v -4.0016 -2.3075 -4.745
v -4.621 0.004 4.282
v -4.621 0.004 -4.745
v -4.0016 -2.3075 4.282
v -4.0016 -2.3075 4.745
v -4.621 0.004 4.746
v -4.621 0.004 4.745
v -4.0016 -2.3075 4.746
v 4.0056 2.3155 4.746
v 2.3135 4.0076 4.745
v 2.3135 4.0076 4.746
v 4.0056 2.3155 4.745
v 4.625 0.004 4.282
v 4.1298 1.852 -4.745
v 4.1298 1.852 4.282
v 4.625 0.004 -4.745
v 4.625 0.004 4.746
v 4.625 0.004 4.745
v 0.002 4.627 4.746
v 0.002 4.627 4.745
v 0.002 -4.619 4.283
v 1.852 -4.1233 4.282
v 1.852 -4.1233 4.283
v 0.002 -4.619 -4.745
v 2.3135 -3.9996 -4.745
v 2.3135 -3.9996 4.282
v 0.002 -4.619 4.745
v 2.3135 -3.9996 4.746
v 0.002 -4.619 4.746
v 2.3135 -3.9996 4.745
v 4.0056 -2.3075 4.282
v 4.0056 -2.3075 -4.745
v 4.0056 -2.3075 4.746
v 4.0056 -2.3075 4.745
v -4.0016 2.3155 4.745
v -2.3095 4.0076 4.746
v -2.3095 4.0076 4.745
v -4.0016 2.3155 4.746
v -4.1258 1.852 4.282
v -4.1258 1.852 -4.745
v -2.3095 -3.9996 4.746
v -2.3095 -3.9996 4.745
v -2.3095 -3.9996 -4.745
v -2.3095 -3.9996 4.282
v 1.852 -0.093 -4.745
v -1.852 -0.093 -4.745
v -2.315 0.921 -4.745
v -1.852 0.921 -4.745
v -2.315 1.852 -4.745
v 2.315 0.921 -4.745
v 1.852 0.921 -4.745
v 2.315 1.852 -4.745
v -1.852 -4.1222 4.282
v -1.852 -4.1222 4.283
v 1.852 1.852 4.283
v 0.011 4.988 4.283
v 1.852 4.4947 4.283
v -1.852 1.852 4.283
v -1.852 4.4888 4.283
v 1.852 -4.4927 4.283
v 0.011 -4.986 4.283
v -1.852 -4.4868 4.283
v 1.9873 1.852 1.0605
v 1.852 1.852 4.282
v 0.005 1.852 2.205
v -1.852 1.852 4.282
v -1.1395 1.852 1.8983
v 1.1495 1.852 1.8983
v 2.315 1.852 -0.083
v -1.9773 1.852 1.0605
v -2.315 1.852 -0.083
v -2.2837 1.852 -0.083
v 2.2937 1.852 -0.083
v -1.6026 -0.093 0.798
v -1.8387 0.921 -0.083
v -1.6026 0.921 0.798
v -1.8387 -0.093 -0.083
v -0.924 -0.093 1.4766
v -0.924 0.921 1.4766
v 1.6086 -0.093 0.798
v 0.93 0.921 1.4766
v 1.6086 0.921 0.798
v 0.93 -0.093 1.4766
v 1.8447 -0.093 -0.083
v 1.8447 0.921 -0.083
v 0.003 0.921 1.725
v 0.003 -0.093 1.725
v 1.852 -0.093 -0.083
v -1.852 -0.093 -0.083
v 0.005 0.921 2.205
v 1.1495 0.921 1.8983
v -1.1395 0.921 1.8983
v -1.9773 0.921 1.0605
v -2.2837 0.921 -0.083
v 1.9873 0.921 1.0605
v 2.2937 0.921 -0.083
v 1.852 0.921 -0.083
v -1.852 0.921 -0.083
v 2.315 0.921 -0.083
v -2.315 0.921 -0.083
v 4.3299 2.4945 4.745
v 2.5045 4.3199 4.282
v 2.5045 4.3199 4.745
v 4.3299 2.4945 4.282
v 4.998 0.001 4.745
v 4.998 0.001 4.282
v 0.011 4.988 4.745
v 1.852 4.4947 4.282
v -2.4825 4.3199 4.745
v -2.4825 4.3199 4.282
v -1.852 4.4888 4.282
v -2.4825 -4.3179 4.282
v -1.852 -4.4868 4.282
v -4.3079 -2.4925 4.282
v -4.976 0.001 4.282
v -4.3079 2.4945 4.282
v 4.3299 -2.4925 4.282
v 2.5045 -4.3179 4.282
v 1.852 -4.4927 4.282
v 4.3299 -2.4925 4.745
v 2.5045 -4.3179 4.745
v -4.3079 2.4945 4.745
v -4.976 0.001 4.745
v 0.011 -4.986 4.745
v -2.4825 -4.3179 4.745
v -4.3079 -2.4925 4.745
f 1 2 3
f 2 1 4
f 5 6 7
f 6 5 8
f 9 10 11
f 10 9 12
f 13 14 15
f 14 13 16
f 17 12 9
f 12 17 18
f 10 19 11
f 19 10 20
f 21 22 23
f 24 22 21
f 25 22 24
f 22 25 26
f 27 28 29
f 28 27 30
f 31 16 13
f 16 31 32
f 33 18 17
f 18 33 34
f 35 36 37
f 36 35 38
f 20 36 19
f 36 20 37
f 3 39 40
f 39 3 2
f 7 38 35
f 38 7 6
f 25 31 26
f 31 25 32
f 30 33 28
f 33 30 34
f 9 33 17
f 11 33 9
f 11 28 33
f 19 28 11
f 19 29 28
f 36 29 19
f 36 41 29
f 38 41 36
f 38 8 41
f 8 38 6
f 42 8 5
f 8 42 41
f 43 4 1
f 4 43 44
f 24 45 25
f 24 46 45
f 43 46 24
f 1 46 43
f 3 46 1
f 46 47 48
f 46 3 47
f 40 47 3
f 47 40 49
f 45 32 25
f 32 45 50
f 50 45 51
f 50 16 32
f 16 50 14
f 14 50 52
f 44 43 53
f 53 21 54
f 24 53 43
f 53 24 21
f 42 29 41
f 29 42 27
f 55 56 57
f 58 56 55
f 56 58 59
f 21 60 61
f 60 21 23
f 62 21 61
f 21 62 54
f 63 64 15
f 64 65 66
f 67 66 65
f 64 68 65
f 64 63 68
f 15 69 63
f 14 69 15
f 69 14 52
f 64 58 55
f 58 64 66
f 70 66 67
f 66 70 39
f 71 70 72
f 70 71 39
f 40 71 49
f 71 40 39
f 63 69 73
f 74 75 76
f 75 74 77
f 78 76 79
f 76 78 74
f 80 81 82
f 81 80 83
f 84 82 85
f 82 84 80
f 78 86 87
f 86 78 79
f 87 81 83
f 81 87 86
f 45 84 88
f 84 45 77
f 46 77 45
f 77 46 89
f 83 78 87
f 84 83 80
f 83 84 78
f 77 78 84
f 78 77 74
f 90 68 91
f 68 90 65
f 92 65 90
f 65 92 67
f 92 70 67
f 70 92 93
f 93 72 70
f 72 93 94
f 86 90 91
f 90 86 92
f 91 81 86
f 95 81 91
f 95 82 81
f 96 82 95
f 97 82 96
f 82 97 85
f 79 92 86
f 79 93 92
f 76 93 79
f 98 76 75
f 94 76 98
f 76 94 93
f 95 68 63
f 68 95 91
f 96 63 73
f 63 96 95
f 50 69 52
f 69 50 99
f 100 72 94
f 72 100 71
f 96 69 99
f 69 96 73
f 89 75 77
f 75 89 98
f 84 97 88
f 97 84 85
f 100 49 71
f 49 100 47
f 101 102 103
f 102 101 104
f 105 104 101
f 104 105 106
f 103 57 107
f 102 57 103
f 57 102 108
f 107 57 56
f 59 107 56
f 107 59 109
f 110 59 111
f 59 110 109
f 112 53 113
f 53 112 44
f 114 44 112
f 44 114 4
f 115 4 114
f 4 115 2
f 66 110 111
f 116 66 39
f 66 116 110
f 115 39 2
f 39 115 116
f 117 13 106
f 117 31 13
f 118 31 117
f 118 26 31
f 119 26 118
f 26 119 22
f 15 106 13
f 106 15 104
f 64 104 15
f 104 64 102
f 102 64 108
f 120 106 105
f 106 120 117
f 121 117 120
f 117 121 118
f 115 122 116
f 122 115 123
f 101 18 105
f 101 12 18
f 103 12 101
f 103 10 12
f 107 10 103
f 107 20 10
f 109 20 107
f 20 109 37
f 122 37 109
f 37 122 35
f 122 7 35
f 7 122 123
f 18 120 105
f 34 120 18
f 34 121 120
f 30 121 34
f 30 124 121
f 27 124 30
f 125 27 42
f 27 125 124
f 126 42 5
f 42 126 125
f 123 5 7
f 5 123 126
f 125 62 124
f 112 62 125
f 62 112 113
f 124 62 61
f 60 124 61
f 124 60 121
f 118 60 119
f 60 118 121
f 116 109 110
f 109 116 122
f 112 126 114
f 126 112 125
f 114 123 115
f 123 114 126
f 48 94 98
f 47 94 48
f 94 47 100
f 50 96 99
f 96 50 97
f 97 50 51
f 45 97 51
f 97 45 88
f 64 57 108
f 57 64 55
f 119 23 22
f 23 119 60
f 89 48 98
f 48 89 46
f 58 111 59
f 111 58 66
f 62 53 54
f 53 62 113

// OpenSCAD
intersection() {
translate([-6, -6, -5.694]) cube(size = [12, 12, 11.389], center = false);
union() {
difference() {
difference() {
translate([0.002, 0.004, -4.745])
cylinder(h = 9.491, r1 = 4.623, r2 = 4.623, center = false, $fn = 12);
translate([-18.2, 1.852, -4.745]) cube(size = [36.4, 16.348, 9.028], center = false);
}
union() {
rotate([180, 90, -90])
translate([0.129, -0.003, -0.093])
cylinder(h = 1.944, r1 = 1.854, r2 = 1.854, center = false, $fn = 12);
rotate([180, 90, -90])
translate([0.084, -0.005, 0.921])
cylinder(h = 17.279, r1 = 2.289, r2 = 2.289, center = false, $fn = 12);
translate([-2.315, -0.093, -4.745]) cube(size = [4.63, 18.293, 4.662], center = false);
}
}
difference() {
union() {
translate([0.011, 0.001, 4.282])
cylinder(h = 0.463, r1 = 4.987, r2 = 4.987, center = false, $fn = 12);
translate([-2.315, -0.093, -4.745]) cube(size = [4.63, 1.014, 4.662], center = false);
}
translate([-1.852, -18.2, -4.745]) cube(size = [3.704, 36.4, 9.028], center = false);
}
}
}
